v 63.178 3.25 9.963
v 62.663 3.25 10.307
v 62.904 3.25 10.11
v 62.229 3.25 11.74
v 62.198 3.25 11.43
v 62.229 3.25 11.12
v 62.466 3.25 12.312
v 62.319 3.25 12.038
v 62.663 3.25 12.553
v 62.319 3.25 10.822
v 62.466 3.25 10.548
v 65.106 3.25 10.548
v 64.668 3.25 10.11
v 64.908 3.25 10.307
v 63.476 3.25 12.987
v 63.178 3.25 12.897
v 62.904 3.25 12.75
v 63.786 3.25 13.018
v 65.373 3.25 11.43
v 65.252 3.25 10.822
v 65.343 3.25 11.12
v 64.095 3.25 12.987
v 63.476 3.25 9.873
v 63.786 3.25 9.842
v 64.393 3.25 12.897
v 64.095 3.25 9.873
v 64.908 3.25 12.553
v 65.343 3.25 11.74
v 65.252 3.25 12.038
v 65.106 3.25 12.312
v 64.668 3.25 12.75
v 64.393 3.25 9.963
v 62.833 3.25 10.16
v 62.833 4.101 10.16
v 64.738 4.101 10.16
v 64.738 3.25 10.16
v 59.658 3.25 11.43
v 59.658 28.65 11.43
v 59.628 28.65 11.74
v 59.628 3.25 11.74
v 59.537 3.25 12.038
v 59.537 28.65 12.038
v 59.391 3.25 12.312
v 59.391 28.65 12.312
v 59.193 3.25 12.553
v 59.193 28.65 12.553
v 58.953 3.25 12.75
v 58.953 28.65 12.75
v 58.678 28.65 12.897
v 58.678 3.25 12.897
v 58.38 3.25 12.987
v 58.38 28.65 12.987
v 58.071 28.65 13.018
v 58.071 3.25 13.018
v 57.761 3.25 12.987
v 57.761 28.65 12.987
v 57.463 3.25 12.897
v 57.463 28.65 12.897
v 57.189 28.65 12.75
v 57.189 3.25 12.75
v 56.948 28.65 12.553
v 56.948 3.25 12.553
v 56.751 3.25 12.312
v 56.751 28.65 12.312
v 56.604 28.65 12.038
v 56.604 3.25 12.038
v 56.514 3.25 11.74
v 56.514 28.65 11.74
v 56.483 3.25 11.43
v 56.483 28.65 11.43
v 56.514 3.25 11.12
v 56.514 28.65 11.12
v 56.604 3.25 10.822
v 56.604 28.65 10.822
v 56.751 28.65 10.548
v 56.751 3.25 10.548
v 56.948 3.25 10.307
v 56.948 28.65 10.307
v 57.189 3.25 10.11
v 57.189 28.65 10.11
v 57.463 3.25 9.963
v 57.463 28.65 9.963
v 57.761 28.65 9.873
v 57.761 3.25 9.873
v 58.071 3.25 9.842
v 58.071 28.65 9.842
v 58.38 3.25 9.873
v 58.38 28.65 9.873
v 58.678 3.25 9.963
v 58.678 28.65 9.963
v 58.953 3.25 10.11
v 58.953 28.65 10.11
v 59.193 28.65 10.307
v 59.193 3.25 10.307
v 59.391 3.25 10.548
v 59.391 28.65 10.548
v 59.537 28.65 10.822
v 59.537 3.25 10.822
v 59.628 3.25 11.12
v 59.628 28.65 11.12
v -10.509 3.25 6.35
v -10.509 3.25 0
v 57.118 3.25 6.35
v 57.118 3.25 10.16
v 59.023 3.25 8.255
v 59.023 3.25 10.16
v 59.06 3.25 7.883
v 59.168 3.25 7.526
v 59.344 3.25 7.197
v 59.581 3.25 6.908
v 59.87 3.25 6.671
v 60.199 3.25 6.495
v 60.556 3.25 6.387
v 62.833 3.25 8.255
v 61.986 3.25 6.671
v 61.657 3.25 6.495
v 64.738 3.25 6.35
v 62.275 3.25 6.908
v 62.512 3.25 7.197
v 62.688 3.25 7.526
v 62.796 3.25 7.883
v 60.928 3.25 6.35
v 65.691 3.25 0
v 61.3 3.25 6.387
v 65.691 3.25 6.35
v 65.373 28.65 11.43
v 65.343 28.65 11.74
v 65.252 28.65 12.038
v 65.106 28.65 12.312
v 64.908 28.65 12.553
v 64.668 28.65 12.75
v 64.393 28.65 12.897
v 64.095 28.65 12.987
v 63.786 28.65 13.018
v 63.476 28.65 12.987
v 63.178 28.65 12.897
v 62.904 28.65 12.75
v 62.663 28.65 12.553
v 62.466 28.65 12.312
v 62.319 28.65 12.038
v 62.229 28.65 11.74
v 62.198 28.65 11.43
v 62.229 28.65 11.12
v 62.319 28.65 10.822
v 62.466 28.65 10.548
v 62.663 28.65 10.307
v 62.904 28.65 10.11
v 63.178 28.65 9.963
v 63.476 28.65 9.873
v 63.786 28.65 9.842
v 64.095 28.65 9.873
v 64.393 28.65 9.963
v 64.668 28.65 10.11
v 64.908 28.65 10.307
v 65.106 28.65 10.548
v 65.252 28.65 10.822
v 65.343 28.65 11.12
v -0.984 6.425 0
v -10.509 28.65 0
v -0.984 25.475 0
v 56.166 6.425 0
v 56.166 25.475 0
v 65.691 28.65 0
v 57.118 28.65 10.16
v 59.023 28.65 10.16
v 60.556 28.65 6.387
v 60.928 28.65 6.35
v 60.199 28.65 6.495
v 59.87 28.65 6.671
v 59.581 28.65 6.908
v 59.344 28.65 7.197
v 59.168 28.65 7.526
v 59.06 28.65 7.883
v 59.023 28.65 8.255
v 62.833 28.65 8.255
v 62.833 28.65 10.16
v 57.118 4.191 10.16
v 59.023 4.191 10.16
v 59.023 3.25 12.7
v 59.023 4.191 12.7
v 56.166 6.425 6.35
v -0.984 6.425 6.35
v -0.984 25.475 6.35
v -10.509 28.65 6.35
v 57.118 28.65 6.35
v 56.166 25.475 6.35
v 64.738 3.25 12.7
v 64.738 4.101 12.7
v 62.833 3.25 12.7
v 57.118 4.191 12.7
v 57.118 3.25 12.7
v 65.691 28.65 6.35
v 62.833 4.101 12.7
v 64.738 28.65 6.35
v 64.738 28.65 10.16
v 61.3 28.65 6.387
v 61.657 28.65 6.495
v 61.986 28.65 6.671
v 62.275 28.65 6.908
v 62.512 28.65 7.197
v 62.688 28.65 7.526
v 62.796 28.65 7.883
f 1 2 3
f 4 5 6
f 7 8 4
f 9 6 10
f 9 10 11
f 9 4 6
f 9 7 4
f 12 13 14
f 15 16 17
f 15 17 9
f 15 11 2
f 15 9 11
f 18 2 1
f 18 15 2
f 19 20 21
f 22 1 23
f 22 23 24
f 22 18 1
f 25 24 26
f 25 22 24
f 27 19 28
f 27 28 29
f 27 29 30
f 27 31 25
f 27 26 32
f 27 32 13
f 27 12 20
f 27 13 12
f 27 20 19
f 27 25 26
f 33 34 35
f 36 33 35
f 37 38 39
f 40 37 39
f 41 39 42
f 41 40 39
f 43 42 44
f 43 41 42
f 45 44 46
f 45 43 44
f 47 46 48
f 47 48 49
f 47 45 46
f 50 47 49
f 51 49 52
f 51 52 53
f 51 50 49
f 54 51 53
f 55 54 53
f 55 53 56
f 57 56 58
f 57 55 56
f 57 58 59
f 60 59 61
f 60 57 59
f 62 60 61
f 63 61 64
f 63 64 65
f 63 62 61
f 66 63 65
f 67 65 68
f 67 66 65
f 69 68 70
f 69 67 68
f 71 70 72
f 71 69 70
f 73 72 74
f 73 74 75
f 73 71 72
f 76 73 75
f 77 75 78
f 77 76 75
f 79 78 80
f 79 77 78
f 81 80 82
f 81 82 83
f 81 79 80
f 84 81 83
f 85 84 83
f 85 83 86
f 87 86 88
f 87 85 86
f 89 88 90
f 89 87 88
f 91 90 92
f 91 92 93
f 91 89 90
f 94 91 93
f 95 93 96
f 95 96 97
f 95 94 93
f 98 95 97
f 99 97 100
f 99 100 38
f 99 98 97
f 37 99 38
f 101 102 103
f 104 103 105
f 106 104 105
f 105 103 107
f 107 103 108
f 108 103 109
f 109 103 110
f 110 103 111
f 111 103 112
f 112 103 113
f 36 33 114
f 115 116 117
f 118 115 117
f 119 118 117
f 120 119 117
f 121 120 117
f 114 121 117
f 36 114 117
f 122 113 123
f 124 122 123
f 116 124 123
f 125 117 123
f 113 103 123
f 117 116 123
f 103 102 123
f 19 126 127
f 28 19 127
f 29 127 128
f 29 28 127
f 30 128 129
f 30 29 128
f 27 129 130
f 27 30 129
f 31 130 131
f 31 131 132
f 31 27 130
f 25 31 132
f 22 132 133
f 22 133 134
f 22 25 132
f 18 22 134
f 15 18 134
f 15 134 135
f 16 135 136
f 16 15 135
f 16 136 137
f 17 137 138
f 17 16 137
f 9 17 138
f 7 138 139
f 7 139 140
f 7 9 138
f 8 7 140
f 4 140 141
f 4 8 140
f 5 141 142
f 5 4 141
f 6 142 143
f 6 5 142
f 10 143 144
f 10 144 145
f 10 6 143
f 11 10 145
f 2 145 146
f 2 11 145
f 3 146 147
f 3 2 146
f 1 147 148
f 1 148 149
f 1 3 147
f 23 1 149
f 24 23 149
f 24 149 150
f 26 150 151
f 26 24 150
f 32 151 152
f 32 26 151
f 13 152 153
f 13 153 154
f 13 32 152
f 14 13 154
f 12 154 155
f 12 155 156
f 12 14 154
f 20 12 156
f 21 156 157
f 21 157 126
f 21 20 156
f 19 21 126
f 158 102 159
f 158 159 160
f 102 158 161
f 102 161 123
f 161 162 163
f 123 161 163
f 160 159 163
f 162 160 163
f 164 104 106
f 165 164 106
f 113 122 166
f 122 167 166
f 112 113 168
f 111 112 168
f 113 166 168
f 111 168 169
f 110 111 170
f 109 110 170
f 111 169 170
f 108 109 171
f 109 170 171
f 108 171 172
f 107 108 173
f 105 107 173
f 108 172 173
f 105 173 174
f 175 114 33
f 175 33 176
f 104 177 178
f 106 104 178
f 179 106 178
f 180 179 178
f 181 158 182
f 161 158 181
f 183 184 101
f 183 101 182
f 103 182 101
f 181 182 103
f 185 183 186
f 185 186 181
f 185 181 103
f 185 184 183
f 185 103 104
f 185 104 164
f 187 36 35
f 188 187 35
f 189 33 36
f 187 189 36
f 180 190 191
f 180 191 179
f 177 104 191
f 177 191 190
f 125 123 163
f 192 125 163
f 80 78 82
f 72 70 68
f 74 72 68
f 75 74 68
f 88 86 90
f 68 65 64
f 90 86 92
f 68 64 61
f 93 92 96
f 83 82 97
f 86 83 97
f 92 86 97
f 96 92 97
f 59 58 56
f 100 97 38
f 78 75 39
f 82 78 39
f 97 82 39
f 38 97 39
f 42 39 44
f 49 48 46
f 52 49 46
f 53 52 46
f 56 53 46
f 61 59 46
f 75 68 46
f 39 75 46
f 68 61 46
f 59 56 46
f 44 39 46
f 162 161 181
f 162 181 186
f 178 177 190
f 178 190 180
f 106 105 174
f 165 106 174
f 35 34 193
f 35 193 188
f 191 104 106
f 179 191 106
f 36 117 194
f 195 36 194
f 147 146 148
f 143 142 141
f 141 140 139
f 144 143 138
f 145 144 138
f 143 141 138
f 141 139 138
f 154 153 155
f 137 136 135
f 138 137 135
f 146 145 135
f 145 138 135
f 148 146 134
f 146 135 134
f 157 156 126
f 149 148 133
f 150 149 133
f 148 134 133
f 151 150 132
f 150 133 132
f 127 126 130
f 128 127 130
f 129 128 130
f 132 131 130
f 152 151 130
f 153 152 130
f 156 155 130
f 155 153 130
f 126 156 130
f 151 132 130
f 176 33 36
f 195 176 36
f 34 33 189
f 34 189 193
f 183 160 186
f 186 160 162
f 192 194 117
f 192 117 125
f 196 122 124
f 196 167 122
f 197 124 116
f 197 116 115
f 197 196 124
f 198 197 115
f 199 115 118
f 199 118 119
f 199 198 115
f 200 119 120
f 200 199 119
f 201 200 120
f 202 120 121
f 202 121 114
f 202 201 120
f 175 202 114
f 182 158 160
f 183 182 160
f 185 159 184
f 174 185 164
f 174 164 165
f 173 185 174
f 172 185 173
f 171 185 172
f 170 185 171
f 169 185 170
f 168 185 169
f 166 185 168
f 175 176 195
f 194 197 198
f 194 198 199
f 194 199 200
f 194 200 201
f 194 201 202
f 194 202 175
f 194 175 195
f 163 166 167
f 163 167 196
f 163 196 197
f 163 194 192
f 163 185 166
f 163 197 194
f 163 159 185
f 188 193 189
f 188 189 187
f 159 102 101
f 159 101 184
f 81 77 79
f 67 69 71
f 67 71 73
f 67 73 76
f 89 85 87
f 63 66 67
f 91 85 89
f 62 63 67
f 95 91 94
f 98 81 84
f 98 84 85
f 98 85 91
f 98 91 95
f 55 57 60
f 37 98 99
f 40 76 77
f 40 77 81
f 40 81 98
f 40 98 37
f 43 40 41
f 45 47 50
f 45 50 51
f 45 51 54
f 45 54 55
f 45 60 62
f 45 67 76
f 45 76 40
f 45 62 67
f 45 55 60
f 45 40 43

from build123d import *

# Parameters (mm, degrees)
F0_W      = 76.2
F0_H      = 25.4
F0_W_2    = 57.15
F0_H_2    = 19.05
F1_DEPTH  = 6.35
F3_W      = 1.905
F3_H      = 25.4
F4_DEPTH  = 3.81
F5_R      = 1.90499
F6_W      = 1.905
F6_H      = 0.8507965779
F7_DEPTH  = 2.54
F8_R      = 1.5875
F9_DEPTH  = 25.4
F10_W     = 1.905
F10_H     = 0.9408806166
F11_DEPTH = 2.54
F12_R     = 1.5875
F13_DEPTH = 25.4


# Not quite as in the source:
# - a fillet or chamfer is up to 0.001 mm smaller than in the source, because OpenCascade refuses the exact size


with BuildPart() as f1:
    # F0 (on Top) → F1 (new body)
    with BuildSketch(Plane.XY):
        with Locations((27.5905542076, 15.9501524599)):
            Rectangle(F0_W, F0_H)
        with Locations((27.5905542076, 15.9501524599)):
            Rectangle(F0_W_2, F0_H_2, mode=Mode.SUBTRACT)
    extrude(amount=F1_DEPTH)

    # F3 (on face) → F4 (join)
    with BuildSketch(Plane.XY.offset(6.35)):
        with Locations((58.0705542076, 15.9501524599)):
            Rectangle(F3_W, F3_H)
        with Locations((63.7855542076, 15.9501524599)):
            Rectangle(F3_W, F3_H)
    extrude(amount=F4_DEPTH)

    # F5 (radius 1.905 in the source; OpenCascade refuses exactly that, so slightly less here)
    f5_edges = [f1.edges().sort_by_distance(p)[0] for p in [
        (59.023054, 15.950152, 6.35),
        (62.833054, 15.950152, 6.35),
    ]]
    fillet(f5_edges, radius=F5_R)


with BuildPart() as f7:
    # F6 (on face) → F7 (new body)
    with BuildSketch(Plane.XY.offset(10.16)):
        with Locations((63.7855542076, 3.6755507489)):
            Rectangle(F6_W, F6_H)
    extrude(amount=F7_DEPTH)


with BuildPart() as f9:
    # F8 (on face) → F9 (new body, through all)
    with BuildSketch(Plane.XZ.offset(-3.2501524599)):
        with Locations((63.7855542076, 11.43)):
            Circle(F8_R)
    extrude(amount=-F9_DEPTH)


with BuildPart() as f11:
    # F10 (on face) → F11 (new body)
    with BuildSketch(Plane.XY.offset(10.16)):
        with Locations((58.0705542076, 3.7205927682)):
            Rectangle(F10_W, F10_H)
    extrude(amount=F11_DEPTH)


with BuildPart() as f13:
    # F12 (on face) → F13 (new body, through all)
    with BuildSketch(Plane.XZ.offset(-3.2501524599)):
        with Locations((58.0705542076, 11.43)):
            Circle(F12_R)
    extrude(amount=-F13_DEPTH)


solid = Compound([f1.part, f7.part, f9.part, f11.part, f13.part])
